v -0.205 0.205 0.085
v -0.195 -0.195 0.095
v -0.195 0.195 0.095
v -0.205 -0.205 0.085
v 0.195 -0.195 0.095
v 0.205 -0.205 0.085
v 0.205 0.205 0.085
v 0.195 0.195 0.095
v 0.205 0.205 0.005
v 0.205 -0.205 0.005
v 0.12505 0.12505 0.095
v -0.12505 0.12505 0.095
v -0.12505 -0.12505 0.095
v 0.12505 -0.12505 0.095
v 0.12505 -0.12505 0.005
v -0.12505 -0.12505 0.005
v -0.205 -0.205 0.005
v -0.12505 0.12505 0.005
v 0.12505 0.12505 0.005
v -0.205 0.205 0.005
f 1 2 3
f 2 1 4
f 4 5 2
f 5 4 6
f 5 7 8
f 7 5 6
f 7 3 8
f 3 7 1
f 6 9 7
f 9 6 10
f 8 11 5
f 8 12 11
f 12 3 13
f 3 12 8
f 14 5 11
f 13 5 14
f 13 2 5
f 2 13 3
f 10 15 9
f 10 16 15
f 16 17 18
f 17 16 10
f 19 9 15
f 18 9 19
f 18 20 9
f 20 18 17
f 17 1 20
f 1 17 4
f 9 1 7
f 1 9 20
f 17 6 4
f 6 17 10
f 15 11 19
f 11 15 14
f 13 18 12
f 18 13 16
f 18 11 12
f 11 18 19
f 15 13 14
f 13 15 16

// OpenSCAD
// file: DataSymbol.scad
boxSize = 0.029;
lineSize = 0.0045;
symDepth = 0.01;
vertSeparation = 0.019;
horizSeparation = 0.018;

module DataSymbol() {
  boxVertCenter = (boxSize+vertSeparation)/2;
  boxHorizCenter = (boxSize+horizSeparation)/2;
  linear_extrude(symDepth, center=true) {
    translate([0,boxVertCenter]) square(boxSize, center=true); // top box
    translate([-boxHorizCenter,-boxVertCenter]) square(boxSize, center=true); // bottom left box
    translate([boxHorizCenter,-boxVertCenter]) square(boxSize, center=true); // bottom right box
    square([2*boxHorizCenter + lineSize, lineSize], center=true); // middle line
    translate([0, horizSeparation/4]) square([lineSize, horizSeparation/2 + lineSize], center=true); // line to top
    translate([-boxHorizCenter, -horizSeparation/4]) square([lineSize, horizSeparation/2 + lineSize], center=true); // line to bottom left
    translate([boxHorizCenter, -horizSeparation/4]) square([lineSize, horizSeparation/2 + lineSize], center=true); // line to bottom right
  }
}

DataSymbol();
// file: PowerSymbol.scad
symWidth = 0.038;
symHeight = 0.086;
symDepth = 0.01;
middleHeight = 0.0075;
topHorizOffset = 0.007;
sideVertOffset = 0.007;

module PowerSymbol() {
  linear_extrude(symDepth, center=true) {
    halfHei = symHeight/2;
    halfWid = symWidth/2;
    halfMid = middleHeight/2;
    polygon([
      [topHorizOffset, halfHei],
      [0, halfMid],
      [halfWid, sideVertOffset],
      [-topHorizOffset, -halfHei],
      [0, -halfMid],
      [-halfWid, -sideVertOffset]
    ]);
  }
}

PowerSymbol();
// file: FPGAHousing_base.scad
include <FPGA_shared.scad>;
use <FPGAHousing_paintcap.scad>;
use <PowerSymbol.scad>;
use <DataSymbol.scad>;

module FPGAHousing_chipcutout() {
  slotPinBaseOffset = (-slotPinEdgeCount-1)/2 * slotPinEdgeSpacing;
  slotPinEdgeOffset = slotSize/2 - slotPinSize/2 - slotPinEdgePad;
  union() {
    translate([0, 0, baseDepth/2 + slotBottom + slotPinDepth]) {
      cube(size=[slotSize, slotSize, baseDepth], center=true);
    }
    for(edge=[1:4]) rotate([0,0,90*edge]) {
      for(i=[1:slotPinEdgeCount]) {
        translate([
          slotPinBaseOffset + slotPinEdgeSpacing*i,
          slotPinEdgeOffset,
          slotBottom + slotPinDepth
        ]) {
          cube(size=[slotPinSize, slotPinSize, slotPinDepth*2], center=true);
        }
      }
    }
    translate([alignHoleOffset,alignHoleOffset,slotBottom + slotPinDepth])
      cylinder(h=alignHoleDepth*2, r=alignHoleRadius, center=true, $fn=alignHoleSides);
  }
}

module FPGAHousing_base() {
  middleSize = (slotSize + capSize) / 2;
  difference() {
    union() {
      translate([0,0,baseCenter])
        cube(size=[baseSize, baseSize, baseDepth], center=true);
      translate([0,0,baseTop-eps])
        cube(size=[middleSize, middleSize, capDepth*2], center=true);
    }
    translate([0,0,baseBottom])
      cube(size=[baseBackCutoutSize, baseBackCutoutSize, baseBackCutoutDepth*2], center=true);
    FPGAHousing_chipcutout();
  }
}

FPGAHousing_base();
%FPGAHousing_paintcap();
// file: FPGA_shared.scad
smallGridSize = 0.5;
baseSize = smallGridSize;
baseTop = 0.05;
baseBottom = -0.045;
baseDepth = baseTop - baseBottom;
baseCenter = (baseTop + baseBottom)/2;
baseBackRim = 0.02;
baseBackCutoutSize = baseSize - baseBackRim*2;
baseBackCutoutDepth = 0.01;
capSize = 0.41;
capDepth = 0.045;
capBevel = 0.01;
slotSize = smallGridSize * 0.5;
slotBottom = 0.03;
slotPinEdgeCount = 4;
slotPinEdgePad = 0.01;
slotPinEdgeSpacing = 0.045;
slotPinSize = 0.025;
slotPinDepth = 0.025;
eps = 0.00001;
chipTotalSize = slotSize - slotPinEdgePad*2 - slotPinSize/2;
chipTotalHeight = 0.1;
chipBaseHeight = 0.05;
pinHorizLength = 0.022;
pinHorizUnderLength = 0.008;
pinHorizWidth = 0.02;
pinHorizHeight = 0.015;
pinVertInnerOffset = 0.003;
pinVertOuterOffset = 0.003;
pinVertNarrowOffset = 0.003;
pinTotalHeight = chipTotalHeight - chipBaseHeight/2 + pinHorizHeight/2;
chipBaseSize = chipTotalSize - pinHorizLength*2;
chipBaseBevelSize = 0.005;
alignHoleRadius = 0.005;
alignHoleOffset = chipBaseSize/2 - 0.02;
alignHoleDepth = 0.005;
alignHoleSides = 8;
decoPinCount = 8;
decoPinWidth = 0.036;
decoPinLength = 0.034;
decoPinHeight = 0.028;
decoPinSpacing = 0.049;
decoPinBevelSize = 0.010;

module cablecutout() {
  cableradius = 0.025;
  cableDepth = 0.0125;
  translate([0,smallGridSize/2,0]) rotate([90,0,0]) {
    cylinder(h=cableDepth*2, r=cableradius, center=true, $fn=8);
  }
}
// main file
include <FPGA_shared.scad>;
use <FPGAHousing_base.scad>;

module FPGAHousing_paintcap() {
  bevelDepth = capBevel * sqrt(2);
  difference() {
    translate([0,0,baseTop]) {
      cube(size=[capSize, capSize, capDepth*2], center=true);
    }
    cube(size=[slotSize+eps*10, slotSize+eps*10, smallGridSize], center=true);
    for (edge=[1:4]) rotate([0,0,90*edge]) {
      translate([0,capSize/2,baseTop+capDepth]) rotate([45,0,0])
        cube(size=[capSize+0.1, bevelDepth, bevelDepth*2], center=true);
    }
  }
}

%FPGAHousing_base();
FPGAHousing_paintcap();
